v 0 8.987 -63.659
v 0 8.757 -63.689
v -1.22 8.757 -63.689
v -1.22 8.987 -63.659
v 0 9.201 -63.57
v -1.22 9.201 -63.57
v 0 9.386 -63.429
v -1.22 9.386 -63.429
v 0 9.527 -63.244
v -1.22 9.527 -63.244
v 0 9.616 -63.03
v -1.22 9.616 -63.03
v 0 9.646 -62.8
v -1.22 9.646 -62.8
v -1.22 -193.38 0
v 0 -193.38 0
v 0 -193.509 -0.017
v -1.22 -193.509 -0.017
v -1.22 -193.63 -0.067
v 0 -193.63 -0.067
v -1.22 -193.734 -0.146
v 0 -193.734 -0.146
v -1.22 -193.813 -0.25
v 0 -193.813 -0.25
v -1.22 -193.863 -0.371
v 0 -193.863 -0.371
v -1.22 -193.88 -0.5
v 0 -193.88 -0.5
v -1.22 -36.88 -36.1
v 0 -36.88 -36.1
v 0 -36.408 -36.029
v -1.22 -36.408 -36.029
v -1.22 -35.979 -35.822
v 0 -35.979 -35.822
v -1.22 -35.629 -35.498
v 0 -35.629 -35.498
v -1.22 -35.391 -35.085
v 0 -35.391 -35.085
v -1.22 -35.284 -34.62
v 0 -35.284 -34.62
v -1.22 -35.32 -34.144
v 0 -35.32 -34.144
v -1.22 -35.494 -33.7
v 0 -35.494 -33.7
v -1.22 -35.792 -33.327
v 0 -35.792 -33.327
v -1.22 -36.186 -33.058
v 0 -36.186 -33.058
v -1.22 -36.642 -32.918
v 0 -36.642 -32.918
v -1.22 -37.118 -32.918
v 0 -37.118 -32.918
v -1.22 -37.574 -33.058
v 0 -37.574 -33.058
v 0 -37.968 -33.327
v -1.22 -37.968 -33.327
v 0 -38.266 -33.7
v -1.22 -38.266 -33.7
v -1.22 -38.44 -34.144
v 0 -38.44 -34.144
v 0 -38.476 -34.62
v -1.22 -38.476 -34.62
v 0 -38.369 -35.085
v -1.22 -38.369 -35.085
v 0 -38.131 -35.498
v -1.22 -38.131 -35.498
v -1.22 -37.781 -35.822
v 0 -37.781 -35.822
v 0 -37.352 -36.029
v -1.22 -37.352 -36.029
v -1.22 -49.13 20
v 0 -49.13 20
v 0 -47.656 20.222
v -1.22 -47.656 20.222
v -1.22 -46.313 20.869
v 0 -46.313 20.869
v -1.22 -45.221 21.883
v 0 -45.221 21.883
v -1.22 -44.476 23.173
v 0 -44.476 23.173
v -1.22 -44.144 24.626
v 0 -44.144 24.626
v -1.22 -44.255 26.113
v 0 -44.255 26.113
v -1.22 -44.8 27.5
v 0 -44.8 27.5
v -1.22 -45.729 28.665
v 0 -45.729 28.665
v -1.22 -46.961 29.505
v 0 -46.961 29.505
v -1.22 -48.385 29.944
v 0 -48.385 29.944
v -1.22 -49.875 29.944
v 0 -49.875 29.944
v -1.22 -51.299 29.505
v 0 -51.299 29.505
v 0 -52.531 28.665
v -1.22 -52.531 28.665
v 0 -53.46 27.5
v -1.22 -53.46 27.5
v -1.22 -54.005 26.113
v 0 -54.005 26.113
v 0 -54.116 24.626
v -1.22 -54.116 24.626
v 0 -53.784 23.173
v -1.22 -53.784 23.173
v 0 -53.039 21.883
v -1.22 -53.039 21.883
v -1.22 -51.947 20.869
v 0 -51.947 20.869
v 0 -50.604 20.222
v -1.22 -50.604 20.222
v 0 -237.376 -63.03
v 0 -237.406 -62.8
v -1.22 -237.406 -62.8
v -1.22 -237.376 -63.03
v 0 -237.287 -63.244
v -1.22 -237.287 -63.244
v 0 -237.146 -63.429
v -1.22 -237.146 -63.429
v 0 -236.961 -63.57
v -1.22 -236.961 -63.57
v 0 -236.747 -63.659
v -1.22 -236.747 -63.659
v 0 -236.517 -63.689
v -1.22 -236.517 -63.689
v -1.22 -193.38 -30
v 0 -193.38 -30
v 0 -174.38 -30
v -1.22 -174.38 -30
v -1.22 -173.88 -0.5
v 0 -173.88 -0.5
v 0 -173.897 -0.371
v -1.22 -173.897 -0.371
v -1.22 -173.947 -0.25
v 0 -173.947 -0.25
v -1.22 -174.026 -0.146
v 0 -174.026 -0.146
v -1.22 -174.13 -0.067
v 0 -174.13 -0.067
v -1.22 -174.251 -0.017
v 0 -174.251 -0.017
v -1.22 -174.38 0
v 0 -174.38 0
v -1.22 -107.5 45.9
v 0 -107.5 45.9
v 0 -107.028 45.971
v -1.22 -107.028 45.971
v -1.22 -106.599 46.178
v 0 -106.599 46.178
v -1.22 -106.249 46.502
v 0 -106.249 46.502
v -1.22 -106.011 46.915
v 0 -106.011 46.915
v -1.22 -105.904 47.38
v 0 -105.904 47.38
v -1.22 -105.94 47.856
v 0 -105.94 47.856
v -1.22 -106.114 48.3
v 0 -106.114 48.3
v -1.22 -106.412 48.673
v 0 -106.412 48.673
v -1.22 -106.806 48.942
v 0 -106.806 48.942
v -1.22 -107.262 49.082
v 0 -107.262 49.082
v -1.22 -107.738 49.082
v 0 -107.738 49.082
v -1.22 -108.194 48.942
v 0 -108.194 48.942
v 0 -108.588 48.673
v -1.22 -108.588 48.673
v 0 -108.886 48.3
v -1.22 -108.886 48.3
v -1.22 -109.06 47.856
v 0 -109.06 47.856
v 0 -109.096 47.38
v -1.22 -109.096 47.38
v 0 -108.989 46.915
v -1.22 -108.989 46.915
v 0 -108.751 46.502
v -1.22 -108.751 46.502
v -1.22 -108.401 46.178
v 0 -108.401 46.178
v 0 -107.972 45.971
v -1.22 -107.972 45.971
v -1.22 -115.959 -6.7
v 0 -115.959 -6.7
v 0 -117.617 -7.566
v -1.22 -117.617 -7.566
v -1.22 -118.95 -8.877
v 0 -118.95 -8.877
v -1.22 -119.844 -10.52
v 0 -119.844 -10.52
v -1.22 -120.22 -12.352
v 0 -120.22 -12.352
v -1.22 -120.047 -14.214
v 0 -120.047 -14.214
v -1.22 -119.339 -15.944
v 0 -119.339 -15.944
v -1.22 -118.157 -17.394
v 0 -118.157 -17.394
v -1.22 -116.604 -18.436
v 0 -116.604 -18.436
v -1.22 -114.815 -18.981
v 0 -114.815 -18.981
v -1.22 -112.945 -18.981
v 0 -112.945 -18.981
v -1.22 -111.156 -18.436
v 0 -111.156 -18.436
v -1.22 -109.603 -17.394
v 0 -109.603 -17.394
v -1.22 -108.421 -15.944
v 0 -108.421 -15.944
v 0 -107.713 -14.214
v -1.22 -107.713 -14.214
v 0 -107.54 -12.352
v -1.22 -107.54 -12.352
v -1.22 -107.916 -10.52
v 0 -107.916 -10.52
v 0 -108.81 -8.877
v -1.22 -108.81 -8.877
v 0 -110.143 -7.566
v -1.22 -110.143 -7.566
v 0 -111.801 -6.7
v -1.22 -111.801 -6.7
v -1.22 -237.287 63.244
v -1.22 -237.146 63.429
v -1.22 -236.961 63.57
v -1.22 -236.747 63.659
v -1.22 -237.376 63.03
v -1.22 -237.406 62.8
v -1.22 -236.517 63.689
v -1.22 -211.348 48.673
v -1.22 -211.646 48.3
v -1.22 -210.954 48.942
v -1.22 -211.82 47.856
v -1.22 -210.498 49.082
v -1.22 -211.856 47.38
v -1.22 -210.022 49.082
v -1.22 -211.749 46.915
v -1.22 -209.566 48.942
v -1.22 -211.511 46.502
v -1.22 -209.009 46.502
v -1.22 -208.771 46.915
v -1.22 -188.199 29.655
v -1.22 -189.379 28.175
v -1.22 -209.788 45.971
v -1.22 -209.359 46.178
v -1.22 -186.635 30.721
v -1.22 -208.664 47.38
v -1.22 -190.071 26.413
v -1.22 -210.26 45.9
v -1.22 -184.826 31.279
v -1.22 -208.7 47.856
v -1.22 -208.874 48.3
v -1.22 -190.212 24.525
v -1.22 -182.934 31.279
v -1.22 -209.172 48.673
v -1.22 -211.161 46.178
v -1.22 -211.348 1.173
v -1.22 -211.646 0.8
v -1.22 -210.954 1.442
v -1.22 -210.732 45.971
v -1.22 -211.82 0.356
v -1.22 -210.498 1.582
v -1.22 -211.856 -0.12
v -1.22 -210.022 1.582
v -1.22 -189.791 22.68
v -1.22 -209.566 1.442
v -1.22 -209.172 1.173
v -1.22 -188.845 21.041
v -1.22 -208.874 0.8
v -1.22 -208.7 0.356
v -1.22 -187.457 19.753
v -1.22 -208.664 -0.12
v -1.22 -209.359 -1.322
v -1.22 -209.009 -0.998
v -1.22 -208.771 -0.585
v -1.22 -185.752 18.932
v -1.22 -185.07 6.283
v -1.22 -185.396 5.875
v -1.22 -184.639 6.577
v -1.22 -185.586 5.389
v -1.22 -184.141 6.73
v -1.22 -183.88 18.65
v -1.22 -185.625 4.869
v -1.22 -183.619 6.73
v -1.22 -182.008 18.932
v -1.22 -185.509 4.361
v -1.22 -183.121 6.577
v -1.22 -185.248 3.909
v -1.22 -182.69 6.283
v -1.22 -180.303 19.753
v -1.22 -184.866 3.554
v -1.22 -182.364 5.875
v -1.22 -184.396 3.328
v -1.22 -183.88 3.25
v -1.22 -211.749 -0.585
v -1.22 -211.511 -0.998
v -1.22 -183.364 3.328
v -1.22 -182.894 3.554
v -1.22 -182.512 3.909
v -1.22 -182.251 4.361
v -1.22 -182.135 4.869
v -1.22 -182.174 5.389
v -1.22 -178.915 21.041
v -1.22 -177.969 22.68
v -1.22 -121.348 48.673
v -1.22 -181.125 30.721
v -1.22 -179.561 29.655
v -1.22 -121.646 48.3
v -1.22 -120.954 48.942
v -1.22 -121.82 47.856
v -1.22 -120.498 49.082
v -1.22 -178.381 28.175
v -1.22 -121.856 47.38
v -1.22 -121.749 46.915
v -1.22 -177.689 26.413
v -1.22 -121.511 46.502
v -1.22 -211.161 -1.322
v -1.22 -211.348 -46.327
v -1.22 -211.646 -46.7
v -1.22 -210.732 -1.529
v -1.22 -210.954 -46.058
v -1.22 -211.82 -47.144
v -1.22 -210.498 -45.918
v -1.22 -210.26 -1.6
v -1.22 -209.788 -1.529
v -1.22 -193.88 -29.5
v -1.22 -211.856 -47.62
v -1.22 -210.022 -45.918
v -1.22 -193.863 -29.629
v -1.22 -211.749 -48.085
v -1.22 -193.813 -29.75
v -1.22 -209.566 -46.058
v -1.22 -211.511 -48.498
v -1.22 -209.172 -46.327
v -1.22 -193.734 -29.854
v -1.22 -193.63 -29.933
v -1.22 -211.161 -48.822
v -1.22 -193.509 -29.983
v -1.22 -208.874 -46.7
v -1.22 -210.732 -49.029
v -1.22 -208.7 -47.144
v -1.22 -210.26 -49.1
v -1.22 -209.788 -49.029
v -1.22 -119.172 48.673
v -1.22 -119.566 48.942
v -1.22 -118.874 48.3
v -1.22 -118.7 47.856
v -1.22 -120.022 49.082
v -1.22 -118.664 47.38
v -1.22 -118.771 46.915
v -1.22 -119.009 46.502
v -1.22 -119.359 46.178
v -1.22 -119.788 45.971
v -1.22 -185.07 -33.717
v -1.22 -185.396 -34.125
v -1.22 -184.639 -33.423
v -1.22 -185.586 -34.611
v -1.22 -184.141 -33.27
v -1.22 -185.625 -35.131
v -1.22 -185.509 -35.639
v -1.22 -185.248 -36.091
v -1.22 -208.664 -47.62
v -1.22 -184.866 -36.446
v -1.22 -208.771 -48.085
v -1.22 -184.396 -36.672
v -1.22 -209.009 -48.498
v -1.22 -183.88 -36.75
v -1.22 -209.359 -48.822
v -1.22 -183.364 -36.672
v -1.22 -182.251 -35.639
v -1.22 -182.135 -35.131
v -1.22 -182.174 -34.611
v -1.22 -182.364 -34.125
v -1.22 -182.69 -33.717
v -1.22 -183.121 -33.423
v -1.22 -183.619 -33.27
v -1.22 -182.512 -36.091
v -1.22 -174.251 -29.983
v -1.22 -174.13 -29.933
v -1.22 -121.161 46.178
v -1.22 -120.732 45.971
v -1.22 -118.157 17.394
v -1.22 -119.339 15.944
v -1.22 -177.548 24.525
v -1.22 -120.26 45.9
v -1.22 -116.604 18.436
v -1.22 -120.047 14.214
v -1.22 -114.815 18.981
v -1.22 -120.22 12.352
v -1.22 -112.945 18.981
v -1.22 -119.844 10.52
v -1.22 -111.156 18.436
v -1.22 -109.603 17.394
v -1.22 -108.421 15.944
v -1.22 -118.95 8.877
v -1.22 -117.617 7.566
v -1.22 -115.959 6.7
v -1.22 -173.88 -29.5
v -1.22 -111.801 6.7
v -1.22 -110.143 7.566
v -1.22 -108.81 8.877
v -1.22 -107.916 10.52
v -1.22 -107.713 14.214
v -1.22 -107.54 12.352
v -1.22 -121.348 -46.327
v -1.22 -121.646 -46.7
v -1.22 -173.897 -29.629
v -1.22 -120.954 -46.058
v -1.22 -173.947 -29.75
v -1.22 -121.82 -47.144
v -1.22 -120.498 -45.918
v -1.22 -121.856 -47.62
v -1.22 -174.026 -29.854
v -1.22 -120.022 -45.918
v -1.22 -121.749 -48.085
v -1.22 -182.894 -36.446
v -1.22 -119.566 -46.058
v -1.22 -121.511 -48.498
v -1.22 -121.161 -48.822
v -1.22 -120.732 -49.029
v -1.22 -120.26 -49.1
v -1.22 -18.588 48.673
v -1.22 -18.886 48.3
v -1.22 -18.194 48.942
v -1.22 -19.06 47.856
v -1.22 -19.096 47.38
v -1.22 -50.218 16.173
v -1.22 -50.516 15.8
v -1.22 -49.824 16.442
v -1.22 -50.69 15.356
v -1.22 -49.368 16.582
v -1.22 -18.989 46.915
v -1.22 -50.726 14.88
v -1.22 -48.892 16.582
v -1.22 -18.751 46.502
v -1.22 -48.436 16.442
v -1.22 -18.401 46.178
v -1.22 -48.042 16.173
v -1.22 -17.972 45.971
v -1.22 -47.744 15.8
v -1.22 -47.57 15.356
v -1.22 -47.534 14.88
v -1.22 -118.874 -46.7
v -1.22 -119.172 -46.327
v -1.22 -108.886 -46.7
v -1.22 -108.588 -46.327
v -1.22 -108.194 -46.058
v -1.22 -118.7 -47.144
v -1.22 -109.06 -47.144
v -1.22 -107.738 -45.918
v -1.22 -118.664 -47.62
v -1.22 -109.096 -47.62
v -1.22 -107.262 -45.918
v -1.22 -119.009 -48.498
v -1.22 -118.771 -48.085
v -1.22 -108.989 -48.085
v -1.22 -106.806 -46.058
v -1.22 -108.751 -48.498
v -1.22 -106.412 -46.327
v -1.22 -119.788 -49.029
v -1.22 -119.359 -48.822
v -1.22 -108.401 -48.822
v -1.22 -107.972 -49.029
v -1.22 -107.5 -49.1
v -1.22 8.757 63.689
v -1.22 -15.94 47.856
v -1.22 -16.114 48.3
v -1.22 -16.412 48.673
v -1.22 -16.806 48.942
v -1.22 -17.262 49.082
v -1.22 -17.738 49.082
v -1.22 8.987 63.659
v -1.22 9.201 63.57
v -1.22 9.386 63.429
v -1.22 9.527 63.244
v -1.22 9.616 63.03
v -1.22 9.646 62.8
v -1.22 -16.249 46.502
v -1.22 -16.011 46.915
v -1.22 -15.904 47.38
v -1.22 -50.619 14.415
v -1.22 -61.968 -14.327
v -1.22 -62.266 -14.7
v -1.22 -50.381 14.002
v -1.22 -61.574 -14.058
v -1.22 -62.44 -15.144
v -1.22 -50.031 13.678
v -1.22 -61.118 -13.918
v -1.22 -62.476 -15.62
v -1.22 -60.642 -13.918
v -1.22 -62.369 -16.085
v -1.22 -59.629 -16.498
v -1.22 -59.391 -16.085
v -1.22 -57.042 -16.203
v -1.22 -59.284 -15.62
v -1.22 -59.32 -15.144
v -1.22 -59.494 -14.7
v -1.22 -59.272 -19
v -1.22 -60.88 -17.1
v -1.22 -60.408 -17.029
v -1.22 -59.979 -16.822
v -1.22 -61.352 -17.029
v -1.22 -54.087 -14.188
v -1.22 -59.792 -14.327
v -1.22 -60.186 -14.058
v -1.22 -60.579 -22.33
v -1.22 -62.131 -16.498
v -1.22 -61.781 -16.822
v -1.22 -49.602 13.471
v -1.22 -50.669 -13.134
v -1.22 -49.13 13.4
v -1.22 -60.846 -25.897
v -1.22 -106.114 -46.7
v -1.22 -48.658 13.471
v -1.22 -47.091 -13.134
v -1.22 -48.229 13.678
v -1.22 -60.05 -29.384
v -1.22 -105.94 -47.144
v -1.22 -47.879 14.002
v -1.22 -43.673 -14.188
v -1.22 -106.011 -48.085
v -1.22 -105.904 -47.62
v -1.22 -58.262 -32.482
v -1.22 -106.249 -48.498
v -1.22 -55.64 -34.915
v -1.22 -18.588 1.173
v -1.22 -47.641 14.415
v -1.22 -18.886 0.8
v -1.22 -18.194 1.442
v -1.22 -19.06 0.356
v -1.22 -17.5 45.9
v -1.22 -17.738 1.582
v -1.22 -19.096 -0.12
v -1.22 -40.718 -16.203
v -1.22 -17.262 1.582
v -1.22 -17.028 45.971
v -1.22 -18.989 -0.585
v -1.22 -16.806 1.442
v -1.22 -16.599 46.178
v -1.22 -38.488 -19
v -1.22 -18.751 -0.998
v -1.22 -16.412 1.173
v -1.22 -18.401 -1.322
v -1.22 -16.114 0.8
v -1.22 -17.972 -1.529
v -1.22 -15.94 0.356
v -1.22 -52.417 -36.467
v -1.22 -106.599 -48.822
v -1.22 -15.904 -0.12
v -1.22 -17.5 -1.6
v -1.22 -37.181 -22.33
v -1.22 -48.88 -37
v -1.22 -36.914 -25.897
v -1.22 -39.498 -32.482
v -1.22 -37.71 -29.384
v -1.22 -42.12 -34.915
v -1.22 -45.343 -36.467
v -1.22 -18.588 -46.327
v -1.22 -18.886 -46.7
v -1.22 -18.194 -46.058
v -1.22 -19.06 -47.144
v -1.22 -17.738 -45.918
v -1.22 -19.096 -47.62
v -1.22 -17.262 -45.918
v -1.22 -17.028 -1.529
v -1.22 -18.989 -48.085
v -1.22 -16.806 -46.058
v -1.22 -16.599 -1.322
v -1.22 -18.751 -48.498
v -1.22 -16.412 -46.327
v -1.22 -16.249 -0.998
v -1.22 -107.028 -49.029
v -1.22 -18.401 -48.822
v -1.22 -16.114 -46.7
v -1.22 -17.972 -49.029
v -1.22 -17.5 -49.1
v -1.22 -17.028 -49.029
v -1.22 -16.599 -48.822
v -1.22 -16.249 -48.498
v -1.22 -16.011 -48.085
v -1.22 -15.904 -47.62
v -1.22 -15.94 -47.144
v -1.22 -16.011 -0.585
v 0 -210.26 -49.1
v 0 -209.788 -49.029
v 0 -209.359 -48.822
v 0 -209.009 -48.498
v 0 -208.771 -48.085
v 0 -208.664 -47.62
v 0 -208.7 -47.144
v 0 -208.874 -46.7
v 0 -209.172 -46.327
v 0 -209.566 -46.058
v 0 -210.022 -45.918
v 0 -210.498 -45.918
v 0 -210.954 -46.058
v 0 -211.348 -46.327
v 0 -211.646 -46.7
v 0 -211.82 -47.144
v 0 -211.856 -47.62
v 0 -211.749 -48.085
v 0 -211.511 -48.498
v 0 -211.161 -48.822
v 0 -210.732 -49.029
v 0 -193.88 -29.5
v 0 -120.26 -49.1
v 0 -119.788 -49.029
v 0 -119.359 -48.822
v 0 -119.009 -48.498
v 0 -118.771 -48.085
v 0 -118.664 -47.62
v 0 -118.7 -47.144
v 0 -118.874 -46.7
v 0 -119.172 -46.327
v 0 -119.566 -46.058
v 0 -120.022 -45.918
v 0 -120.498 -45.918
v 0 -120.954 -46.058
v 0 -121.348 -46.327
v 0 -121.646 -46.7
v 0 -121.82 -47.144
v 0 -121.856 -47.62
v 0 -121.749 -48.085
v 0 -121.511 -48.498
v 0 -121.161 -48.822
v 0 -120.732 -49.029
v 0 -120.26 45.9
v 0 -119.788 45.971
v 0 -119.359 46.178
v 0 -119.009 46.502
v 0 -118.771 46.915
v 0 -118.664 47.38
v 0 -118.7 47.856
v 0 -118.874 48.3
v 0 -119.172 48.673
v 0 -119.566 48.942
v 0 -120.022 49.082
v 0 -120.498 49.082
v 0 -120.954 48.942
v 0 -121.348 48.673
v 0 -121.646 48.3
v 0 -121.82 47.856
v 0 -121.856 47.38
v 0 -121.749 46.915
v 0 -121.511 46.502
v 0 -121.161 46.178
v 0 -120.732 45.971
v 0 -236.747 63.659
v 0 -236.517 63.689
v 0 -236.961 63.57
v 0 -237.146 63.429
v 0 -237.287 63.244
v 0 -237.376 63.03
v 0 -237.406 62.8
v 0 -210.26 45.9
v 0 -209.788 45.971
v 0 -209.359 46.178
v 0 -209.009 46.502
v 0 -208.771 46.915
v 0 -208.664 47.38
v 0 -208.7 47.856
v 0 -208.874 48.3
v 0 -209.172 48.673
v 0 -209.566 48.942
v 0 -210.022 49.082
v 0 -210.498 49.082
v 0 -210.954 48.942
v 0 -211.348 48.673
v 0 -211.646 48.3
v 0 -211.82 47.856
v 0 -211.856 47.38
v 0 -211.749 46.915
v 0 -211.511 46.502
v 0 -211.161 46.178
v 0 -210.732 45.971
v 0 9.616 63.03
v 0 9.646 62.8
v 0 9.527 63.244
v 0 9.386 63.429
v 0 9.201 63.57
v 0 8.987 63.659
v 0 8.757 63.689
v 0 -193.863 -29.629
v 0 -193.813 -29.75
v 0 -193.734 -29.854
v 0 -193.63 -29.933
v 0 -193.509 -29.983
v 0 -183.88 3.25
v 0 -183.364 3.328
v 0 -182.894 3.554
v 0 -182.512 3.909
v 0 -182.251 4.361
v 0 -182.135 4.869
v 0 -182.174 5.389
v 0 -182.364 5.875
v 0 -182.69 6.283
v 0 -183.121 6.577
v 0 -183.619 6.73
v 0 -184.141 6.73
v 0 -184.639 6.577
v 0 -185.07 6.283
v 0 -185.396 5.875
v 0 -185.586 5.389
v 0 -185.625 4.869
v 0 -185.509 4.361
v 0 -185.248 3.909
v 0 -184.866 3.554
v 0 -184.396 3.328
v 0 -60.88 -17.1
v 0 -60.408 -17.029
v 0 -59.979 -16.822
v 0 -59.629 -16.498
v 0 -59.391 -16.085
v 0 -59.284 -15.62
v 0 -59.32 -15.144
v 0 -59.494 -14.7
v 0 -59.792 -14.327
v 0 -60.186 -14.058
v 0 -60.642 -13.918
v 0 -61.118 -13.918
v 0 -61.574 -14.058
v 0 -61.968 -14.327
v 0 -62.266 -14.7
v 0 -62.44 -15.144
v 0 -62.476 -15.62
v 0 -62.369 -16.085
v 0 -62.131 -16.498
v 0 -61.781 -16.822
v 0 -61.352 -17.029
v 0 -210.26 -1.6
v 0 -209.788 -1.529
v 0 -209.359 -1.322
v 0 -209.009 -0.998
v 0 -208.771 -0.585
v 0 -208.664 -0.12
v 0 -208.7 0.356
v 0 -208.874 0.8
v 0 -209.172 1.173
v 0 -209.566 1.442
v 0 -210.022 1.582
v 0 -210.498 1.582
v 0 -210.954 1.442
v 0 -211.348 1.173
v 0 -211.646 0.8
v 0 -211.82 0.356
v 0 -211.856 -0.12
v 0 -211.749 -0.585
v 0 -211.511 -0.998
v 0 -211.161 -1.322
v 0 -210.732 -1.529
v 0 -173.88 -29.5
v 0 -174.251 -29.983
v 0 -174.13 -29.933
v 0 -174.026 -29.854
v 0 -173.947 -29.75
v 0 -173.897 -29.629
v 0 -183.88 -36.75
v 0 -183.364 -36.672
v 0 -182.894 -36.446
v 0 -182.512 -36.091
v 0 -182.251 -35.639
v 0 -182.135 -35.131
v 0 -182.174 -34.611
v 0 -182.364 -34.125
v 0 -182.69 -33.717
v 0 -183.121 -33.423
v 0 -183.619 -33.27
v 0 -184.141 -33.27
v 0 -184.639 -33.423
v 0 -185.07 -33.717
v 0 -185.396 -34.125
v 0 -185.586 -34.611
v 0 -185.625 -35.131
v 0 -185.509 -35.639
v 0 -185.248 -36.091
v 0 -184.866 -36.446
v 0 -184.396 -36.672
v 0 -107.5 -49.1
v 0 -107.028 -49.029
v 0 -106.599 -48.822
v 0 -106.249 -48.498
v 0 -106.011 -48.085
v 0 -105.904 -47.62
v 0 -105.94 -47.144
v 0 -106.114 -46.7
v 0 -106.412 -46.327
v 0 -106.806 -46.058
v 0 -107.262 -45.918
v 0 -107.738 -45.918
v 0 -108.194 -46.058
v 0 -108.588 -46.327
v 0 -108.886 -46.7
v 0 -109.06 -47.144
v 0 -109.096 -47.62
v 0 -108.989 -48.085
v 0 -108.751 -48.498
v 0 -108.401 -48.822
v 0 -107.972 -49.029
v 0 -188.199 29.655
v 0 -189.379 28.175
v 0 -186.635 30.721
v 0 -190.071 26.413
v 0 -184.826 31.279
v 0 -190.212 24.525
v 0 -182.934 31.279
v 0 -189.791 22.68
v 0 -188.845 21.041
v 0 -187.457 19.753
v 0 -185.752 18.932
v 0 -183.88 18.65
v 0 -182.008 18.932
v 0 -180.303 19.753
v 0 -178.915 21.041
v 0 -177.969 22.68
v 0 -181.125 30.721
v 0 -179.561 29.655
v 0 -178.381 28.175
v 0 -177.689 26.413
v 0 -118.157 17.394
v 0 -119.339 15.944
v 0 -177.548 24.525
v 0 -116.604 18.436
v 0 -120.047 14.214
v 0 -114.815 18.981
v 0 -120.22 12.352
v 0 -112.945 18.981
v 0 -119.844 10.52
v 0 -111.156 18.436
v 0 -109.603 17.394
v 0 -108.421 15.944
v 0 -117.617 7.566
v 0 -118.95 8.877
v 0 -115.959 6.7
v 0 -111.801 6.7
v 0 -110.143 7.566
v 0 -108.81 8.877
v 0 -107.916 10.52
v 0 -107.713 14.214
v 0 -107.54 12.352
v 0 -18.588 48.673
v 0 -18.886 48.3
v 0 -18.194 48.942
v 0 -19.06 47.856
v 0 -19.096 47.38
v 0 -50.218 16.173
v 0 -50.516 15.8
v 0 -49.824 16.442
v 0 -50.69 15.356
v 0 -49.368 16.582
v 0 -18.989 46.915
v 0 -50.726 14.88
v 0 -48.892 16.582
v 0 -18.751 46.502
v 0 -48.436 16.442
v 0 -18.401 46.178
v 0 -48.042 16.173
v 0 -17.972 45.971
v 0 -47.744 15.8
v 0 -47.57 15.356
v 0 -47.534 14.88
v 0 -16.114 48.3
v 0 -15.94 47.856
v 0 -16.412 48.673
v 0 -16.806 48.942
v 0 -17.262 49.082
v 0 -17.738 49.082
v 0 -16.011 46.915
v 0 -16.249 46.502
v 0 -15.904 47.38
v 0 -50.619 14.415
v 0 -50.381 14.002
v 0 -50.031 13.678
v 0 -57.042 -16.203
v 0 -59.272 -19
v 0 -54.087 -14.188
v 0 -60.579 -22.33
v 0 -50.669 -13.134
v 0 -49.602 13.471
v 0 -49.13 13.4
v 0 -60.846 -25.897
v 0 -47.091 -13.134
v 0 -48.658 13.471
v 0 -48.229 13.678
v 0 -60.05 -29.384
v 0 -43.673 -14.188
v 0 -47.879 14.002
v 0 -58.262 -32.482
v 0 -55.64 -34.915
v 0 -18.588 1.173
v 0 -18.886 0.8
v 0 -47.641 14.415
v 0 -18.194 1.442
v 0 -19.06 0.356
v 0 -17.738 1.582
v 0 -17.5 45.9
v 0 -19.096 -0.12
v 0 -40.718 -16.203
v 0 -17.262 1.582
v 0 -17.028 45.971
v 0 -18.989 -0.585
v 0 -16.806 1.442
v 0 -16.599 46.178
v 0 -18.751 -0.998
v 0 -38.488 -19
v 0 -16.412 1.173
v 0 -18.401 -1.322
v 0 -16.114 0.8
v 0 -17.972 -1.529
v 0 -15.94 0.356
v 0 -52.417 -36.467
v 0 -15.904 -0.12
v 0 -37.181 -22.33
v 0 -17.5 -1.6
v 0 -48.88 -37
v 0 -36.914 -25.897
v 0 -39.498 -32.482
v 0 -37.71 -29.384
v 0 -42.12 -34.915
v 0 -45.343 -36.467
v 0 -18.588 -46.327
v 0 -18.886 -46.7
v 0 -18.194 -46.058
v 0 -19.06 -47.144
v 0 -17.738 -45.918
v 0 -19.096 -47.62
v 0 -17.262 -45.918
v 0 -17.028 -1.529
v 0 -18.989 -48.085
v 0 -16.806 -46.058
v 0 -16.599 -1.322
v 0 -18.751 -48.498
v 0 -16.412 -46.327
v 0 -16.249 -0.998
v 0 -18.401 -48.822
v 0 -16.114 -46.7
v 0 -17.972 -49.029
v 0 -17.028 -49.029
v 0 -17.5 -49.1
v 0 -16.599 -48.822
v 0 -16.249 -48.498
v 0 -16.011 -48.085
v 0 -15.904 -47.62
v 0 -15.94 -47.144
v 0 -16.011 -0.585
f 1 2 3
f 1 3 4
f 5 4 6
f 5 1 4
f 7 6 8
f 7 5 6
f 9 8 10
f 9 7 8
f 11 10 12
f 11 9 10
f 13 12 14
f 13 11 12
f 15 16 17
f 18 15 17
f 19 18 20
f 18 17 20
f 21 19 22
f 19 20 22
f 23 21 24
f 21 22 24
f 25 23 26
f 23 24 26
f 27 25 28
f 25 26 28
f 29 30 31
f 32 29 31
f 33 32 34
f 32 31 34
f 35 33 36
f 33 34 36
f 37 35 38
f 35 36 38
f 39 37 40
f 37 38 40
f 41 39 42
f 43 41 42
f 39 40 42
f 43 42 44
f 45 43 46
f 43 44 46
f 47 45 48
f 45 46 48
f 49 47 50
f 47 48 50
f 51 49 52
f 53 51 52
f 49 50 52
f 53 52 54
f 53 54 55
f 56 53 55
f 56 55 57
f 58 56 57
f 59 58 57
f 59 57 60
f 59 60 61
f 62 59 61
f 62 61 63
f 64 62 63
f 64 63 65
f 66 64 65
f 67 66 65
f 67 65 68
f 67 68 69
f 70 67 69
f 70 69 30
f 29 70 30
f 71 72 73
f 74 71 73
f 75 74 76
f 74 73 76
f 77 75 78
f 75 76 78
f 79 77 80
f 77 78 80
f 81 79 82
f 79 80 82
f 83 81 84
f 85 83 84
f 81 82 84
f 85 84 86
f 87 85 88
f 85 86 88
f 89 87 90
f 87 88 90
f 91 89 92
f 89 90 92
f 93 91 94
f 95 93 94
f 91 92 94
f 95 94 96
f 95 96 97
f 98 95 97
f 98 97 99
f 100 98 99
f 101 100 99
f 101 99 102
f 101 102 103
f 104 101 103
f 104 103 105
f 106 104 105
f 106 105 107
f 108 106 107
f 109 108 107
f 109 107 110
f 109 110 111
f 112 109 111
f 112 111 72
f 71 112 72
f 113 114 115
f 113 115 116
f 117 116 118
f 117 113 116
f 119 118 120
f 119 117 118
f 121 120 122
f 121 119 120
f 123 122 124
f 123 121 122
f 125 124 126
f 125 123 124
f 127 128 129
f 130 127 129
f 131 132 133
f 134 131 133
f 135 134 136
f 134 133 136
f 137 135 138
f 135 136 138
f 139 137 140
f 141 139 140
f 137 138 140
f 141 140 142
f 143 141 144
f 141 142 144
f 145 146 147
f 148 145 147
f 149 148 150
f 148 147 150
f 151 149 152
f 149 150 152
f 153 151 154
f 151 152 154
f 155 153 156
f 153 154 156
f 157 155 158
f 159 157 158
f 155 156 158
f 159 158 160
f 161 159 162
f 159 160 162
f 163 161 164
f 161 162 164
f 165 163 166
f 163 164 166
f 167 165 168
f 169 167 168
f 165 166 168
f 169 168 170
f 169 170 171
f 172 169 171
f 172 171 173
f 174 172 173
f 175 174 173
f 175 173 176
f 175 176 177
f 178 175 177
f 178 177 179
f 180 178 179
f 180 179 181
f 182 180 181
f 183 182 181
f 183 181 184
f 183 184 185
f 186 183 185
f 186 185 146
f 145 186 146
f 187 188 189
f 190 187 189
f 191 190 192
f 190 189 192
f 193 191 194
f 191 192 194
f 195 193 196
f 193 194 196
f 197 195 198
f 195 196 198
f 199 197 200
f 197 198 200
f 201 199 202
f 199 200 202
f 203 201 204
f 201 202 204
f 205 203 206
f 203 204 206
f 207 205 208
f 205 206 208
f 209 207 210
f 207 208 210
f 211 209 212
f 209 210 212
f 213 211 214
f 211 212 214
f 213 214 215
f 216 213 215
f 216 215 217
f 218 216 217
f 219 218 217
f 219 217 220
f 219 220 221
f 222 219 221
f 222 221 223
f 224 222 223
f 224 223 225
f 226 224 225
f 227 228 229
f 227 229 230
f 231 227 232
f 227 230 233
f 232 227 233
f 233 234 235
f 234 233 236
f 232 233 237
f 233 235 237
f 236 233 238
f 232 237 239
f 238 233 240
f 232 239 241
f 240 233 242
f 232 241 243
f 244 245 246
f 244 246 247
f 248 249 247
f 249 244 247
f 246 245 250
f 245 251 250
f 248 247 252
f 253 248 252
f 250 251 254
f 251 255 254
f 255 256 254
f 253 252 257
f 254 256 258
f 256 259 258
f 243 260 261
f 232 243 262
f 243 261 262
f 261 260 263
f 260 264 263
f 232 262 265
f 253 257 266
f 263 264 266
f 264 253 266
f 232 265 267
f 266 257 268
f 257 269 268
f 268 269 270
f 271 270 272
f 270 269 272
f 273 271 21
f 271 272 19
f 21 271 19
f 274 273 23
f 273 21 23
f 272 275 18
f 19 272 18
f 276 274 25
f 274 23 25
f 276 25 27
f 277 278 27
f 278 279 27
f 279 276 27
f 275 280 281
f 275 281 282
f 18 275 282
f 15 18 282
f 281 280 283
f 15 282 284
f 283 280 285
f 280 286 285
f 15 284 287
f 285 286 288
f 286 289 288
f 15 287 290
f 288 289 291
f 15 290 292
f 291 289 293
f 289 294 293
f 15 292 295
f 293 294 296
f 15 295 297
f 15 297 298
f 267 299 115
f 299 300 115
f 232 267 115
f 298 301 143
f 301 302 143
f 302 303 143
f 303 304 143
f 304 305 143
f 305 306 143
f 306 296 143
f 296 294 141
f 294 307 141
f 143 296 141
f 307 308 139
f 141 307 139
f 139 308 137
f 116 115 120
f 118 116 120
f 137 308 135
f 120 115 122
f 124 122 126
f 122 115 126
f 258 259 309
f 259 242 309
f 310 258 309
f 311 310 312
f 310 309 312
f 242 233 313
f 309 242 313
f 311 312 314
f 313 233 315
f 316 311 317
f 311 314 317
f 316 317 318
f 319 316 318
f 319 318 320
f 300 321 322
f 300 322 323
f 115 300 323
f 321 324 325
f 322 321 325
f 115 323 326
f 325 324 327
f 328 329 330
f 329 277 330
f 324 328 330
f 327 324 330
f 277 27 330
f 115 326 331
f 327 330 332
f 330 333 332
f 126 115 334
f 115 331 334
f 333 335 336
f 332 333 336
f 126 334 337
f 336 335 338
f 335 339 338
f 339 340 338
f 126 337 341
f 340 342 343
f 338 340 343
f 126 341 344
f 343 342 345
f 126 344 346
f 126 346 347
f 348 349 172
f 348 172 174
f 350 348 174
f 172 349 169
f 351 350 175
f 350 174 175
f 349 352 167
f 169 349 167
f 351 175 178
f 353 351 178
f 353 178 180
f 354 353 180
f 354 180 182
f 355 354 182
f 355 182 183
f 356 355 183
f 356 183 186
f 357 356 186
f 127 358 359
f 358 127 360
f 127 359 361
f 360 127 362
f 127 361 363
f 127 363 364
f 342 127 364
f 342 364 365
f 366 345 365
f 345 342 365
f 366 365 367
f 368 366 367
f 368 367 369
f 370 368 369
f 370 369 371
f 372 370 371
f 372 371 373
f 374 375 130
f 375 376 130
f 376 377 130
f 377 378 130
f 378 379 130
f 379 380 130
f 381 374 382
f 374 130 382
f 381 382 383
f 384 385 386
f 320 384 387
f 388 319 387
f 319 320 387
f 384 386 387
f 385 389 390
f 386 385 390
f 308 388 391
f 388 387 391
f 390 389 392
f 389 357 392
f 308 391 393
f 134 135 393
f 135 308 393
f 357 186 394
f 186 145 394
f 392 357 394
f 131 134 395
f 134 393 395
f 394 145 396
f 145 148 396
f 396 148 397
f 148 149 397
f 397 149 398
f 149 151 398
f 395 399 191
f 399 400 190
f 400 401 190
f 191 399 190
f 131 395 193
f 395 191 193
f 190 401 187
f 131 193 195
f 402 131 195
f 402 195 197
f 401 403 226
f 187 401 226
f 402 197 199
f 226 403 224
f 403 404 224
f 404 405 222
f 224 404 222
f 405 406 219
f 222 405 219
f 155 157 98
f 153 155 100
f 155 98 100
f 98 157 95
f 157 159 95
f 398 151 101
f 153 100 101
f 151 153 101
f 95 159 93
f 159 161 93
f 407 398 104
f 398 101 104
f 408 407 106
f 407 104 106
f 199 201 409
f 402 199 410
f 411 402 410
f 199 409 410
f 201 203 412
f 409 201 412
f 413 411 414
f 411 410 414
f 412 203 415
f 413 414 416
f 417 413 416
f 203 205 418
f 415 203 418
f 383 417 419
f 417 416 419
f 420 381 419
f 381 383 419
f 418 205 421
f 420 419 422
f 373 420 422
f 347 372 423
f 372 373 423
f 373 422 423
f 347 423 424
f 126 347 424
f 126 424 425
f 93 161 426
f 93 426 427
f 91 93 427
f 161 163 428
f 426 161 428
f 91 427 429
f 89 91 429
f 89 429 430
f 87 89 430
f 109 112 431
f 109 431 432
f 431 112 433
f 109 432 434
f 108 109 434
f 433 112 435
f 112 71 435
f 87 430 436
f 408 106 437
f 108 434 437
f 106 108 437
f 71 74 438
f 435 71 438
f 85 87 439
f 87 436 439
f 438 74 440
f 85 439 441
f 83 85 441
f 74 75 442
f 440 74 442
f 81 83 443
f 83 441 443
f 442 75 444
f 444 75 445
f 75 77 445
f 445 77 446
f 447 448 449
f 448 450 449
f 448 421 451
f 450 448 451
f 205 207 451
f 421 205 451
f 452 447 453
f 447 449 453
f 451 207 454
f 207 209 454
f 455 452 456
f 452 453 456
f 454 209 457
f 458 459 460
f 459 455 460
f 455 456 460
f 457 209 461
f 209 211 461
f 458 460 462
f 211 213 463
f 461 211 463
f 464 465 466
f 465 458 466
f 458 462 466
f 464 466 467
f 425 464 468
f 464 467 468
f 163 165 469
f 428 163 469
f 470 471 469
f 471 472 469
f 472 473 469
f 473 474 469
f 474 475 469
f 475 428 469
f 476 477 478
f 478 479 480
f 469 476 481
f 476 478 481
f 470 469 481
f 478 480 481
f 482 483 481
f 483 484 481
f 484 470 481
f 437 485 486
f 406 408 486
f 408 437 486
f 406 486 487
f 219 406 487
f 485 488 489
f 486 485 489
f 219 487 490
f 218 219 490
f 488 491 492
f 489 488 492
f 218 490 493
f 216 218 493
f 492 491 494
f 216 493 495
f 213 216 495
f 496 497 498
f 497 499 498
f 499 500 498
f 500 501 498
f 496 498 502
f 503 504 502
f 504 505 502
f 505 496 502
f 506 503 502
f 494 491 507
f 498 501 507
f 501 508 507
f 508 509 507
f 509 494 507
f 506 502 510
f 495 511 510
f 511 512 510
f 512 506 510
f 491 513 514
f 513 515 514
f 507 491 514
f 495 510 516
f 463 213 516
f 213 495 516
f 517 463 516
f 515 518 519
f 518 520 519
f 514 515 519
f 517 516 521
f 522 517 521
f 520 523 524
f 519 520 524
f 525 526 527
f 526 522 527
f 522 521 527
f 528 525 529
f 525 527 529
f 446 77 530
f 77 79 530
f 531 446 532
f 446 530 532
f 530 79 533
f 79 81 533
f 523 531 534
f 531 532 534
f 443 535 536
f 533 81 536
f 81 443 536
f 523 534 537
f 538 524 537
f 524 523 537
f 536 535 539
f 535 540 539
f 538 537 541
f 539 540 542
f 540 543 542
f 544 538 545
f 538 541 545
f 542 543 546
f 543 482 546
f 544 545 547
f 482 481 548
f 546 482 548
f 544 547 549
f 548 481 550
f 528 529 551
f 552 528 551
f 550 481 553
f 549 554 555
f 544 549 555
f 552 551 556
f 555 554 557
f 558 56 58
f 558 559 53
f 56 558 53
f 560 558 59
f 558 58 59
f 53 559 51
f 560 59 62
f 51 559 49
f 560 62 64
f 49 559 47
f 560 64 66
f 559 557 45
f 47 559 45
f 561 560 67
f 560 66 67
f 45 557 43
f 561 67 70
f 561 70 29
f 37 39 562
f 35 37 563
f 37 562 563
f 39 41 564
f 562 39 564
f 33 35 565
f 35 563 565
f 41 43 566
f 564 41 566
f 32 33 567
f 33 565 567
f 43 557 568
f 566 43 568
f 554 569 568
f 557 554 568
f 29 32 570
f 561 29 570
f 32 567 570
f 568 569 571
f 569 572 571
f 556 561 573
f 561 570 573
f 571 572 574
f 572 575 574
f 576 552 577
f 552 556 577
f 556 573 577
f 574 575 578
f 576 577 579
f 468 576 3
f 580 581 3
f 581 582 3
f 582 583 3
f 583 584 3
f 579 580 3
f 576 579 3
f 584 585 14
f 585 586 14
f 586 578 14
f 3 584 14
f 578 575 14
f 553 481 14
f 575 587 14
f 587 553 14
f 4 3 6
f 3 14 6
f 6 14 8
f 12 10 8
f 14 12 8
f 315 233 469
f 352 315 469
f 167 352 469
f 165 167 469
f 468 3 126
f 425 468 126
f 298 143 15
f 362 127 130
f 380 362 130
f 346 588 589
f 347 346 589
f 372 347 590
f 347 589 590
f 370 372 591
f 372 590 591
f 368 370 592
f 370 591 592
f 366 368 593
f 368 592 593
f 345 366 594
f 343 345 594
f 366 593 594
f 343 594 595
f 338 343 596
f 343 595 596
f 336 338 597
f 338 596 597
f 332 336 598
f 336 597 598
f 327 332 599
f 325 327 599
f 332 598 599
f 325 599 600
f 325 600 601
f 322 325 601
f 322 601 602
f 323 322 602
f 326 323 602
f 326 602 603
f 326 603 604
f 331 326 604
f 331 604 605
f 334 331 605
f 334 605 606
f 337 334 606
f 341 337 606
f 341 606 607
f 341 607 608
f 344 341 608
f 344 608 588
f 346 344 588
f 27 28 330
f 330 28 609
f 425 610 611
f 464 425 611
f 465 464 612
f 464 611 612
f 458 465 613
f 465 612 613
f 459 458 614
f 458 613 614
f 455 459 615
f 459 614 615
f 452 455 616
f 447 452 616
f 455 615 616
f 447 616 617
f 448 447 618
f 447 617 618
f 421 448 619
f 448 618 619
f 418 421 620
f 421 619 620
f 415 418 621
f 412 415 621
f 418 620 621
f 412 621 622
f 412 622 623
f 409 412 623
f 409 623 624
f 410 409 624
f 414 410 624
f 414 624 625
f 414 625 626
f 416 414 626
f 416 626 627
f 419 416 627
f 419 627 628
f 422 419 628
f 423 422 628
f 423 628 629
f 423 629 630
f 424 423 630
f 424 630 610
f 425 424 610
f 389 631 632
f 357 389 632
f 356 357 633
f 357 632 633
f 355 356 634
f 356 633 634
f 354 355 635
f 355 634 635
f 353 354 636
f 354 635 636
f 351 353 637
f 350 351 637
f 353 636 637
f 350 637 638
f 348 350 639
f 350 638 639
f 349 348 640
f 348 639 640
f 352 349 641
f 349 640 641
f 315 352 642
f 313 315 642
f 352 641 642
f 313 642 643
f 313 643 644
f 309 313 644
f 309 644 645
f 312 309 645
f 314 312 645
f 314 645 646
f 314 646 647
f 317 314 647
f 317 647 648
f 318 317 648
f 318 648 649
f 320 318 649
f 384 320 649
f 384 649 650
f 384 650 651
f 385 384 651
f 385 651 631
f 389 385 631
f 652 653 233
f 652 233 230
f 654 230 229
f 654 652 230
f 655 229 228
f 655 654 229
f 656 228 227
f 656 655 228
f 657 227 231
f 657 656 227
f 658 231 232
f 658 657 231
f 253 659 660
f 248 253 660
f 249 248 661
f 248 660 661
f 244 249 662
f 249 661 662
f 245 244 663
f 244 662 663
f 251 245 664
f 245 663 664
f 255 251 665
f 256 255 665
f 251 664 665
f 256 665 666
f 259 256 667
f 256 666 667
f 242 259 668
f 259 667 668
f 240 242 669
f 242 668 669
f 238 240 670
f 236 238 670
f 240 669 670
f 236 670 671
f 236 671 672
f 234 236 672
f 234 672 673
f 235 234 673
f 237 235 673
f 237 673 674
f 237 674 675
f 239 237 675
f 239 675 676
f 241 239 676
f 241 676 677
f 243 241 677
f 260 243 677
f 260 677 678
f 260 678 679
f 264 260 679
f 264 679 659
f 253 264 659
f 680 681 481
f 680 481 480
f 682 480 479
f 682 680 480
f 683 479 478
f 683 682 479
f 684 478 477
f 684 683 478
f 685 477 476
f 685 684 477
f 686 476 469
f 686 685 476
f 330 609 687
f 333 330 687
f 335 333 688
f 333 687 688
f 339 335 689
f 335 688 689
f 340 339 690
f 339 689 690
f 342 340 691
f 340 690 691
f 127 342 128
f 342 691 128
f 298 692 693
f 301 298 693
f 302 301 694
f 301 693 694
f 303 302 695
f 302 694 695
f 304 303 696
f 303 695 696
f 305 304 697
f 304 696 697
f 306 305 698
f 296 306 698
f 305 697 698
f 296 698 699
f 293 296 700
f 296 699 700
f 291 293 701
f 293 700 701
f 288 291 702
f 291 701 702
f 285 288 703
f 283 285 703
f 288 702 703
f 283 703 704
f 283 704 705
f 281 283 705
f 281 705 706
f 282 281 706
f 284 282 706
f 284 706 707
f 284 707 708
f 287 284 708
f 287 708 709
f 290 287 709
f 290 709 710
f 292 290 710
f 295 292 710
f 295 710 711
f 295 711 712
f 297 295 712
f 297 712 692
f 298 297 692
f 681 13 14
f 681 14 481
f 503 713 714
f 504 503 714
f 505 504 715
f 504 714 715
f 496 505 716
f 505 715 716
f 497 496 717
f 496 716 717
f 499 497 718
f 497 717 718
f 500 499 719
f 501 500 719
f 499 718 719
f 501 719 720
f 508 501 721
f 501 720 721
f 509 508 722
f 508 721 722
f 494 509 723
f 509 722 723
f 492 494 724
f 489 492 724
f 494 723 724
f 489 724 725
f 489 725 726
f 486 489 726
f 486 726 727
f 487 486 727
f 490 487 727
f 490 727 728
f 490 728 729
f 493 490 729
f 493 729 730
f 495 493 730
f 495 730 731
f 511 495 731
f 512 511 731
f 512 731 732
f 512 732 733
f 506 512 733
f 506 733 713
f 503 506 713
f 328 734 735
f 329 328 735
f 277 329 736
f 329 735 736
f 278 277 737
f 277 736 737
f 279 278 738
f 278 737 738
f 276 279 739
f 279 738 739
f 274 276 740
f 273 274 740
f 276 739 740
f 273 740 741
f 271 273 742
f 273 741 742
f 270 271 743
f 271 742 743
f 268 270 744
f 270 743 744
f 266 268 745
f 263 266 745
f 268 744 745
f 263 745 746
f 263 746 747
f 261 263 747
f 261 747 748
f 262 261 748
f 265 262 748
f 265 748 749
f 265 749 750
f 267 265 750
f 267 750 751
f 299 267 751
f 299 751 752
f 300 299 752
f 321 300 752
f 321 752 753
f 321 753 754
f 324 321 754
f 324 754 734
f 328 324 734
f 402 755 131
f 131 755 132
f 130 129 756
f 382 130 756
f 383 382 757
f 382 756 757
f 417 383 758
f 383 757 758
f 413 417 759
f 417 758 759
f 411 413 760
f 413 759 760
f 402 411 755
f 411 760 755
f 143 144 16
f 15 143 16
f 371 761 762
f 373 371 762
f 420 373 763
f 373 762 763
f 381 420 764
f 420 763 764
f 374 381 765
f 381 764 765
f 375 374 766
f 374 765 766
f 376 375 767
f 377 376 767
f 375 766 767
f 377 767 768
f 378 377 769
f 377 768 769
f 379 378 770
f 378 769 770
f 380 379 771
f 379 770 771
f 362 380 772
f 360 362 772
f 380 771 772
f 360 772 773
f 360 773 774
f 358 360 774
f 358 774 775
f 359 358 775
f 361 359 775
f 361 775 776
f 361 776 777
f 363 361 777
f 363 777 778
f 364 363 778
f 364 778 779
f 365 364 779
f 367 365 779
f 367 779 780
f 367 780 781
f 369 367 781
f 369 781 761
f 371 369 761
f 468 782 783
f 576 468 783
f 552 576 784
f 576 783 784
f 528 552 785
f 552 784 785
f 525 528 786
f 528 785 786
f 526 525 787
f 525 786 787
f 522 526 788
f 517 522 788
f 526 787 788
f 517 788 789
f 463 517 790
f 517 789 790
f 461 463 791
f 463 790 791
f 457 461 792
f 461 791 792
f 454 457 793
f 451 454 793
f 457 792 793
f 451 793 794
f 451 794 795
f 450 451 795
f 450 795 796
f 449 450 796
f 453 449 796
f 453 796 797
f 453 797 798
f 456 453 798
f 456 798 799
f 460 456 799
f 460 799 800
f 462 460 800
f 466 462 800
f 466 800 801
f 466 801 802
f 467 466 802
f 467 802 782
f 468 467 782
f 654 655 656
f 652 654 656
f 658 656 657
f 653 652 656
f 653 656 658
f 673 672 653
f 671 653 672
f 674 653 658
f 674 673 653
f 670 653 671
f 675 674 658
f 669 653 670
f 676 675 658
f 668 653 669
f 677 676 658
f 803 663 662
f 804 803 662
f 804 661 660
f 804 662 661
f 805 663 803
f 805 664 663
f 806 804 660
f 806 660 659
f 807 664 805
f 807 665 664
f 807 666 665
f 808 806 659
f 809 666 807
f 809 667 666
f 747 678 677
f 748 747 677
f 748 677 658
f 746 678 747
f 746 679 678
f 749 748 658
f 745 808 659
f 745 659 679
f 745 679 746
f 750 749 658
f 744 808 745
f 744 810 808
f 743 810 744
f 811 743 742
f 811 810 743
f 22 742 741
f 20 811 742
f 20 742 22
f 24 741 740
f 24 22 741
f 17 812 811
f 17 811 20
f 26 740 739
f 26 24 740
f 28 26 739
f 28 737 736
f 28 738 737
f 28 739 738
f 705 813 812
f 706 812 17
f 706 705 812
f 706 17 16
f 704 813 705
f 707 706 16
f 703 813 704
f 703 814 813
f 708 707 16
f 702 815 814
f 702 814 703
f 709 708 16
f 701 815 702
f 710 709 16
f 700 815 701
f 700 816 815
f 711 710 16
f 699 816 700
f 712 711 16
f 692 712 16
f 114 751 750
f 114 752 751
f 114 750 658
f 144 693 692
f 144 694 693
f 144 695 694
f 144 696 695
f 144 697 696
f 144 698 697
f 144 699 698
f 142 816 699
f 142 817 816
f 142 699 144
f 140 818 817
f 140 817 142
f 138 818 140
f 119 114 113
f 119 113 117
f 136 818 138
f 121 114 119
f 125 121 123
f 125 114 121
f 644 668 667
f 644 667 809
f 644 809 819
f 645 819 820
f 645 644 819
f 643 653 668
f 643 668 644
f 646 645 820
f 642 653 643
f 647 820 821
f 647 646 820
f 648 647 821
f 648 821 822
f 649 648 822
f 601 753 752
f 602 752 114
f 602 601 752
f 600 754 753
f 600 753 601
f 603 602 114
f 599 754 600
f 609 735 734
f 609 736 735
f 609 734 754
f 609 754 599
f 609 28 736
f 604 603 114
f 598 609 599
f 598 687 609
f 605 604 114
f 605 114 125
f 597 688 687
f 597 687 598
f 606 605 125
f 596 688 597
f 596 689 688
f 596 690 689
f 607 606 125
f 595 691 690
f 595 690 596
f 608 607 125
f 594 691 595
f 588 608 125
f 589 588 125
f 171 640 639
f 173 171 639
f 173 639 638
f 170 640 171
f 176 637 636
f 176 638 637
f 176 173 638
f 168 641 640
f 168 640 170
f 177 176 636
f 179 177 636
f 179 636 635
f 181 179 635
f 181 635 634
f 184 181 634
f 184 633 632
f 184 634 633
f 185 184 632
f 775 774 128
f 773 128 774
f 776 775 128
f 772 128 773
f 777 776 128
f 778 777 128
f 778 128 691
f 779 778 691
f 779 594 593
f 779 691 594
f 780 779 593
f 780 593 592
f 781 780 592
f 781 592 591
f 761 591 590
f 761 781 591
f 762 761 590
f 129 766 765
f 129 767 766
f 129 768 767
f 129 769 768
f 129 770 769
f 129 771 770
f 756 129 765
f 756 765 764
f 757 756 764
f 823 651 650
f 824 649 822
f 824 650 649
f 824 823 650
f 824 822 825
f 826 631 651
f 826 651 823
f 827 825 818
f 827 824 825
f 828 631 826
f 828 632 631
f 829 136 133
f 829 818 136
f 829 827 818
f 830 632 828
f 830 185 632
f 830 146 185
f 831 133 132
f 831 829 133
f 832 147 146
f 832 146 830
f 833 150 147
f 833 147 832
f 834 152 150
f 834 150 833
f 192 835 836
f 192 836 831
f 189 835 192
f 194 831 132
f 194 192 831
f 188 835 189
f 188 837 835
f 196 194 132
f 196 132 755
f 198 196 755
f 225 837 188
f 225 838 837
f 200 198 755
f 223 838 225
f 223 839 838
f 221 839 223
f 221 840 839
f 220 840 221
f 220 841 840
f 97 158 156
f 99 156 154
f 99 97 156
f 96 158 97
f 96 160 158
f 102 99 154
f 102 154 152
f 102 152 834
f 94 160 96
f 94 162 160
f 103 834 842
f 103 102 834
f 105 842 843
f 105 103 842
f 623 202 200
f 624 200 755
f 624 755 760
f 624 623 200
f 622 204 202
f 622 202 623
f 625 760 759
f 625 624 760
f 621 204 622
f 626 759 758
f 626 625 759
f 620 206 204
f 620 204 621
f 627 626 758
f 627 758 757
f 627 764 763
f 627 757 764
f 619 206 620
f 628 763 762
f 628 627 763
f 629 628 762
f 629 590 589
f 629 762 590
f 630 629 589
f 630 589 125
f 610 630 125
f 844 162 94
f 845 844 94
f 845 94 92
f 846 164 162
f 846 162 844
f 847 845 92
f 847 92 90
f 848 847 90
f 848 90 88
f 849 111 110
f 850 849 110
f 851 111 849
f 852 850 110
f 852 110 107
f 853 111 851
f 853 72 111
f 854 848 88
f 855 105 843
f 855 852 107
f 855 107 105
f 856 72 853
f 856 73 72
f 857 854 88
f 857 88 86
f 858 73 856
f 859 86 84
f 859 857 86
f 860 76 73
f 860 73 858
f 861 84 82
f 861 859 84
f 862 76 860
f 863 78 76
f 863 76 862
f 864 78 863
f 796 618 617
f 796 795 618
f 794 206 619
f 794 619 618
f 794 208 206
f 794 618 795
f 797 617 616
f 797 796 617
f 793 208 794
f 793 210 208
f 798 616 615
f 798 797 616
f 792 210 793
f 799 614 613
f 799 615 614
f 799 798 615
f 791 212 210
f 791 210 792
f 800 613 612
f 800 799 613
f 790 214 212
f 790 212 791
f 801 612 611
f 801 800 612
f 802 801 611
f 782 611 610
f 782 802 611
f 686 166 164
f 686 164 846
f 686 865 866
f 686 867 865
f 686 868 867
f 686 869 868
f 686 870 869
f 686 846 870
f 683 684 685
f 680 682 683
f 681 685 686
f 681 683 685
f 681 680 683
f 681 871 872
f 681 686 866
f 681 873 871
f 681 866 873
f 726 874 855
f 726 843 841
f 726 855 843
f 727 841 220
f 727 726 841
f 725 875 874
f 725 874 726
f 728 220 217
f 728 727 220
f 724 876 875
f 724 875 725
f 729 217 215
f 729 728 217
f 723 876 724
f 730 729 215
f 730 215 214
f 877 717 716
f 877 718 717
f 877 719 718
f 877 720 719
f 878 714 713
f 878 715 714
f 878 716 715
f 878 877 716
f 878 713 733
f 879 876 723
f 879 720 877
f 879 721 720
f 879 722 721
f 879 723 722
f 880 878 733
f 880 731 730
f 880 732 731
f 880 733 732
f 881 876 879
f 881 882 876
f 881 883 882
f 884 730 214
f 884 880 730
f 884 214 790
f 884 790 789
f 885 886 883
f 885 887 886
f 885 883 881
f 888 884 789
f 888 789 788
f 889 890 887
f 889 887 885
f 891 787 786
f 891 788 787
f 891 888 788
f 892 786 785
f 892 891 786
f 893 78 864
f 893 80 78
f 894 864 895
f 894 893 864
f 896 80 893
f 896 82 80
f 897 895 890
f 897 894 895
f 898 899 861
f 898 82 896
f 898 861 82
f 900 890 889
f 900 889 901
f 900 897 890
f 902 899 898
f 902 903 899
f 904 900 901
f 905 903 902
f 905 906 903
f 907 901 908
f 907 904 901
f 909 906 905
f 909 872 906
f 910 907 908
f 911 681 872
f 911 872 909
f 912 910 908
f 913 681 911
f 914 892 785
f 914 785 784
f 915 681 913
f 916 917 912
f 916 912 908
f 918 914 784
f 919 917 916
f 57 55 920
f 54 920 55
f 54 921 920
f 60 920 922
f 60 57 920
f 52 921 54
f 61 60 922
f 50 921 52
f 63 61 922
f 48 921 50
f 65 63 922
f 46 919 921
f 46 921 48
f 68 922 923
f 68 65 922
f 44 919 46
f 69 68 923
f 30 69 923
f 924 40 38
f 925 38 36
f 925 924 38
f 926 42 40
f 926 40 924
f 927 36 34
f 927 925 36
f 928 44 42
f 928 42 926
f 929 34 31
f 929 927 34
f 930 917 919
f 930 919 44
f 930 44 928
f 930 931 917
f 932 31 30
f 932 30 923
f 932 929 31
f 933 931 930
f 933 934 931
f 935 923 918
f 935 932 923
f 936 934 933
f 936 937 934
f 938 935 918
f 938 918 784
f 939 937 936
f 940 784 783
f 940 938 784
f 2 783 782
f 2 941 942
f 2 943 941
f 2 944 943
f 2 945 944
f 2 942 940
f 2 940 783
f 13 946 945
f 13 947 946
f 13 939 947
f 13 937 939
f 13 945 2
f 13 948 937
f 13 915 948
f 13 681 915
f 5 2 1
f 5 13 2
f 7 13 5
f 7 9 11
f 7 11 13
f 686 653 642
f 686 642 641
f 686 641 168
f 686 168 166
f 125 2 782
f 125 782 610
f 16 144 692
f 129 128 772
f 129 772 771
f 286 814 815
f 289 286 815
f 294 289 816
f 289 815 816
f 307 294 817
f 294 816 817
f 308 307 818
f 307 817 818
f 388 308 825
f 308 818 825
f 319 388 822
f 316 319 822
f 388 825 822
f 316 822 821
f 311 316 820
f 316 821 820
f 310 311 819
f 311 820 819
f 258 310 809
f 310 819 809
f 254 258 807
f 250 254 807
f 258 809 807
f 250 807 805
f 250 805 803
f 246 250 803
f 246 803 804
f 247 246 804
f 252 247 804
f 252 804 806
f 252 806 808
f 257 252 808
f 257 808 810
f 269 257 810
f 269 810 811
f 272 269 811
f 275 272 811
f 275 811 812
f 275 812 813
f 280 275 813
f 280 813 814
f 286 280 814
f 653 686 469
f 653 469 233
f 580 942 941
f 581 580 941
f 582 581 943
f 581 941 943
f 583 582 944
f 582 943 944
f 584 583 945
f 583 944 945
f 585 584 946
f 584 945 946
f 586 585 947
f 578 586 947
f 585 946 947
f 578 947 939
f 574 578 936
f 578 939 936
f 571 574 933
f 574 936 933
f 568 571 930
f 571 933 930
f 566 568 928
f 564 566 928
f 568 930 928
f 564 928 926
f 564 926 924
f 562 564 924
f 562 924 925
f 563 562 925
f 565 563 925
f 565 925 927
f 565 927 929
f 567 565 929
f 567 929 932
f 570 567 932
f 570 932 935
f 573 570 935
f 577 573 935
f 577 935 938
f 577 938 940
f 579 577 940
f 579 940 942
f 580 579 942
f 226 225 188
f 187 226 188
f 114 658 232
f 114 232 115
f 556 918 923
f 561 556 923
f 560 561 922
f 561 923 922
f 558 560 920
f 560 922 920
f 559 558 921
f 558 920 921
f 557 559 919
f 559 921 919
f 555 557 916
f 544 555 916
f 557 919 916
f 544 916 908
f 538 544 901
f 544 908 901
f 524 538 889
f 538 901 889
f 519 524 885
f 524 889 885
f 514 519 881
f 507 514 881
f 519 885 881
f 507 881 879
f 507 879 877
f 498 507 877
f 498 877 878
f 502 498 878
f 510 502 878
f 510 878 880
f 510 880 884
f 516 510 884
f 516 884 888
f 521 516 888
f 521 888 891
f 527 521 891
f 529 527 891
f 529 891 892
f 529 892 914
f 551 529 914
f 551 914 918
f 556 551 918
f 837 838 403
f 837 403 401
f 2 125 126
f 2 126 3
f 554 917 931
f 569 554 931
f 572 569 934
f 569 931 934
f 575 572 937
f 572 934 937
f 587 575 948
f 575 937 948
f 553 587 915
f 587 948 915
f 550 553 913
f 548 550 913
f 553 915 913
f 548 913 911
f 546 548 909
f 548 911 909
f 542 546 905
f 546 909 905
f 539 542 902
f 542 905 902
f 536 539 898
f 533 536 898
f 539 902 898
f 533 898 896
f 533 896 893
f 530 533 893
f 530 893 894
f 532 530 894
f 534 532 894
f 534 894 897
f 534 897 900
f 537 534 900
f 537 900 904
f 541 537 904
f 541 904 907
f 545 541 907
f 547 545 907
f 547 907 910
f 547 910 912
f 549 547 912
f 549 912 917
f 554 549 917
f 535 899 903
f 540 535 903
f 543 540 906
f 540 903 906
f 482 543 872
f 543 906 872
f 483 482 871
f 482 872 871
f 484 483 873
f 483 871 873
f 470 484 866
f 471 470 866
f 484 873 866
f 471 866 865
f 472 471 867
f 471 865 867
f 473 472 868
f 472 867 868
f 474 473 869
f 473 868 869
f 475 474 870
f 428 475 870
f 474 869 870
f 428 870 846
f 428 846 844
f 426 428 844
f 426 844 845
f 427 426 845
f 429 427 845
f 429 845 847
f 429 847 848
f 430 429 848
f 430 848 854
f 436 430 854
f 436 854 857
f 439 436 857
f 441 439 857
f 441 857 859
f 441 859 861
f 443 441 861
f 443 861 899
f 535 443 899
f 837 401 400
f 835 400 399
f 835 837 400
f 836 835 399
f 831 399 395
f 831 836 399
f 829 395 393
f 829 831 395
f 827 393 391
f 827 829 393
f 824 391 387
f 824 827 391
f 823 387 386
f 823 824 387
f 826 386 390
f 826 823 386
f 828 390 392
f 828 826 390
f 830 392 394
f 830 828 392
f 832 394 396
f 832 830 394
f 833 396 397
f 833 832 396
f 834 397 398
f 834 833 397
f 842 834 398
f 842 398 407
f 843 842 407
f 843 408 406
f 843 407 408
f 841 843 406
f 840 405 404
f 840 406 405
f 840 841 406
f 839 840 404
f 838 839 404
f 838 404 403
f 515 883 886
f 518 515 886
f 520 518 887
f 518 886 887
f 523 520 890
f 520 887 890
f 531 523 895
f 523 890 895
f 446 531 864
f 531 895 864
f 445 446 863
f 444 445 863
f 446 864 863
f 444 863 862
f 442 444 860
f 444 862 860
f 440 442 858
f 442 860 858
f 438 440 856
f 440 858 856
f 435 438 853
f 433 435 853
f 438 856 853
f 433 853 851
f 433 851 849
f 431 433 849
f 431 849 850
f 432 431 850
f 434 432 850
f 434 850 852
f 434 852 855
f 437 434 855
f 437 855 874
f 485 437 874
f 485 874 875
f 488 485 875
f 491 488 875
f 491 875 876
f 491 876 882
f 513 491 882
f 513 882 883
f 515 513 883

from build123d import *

# Parameters (mm, degrees)
BOSS_EXTRUDE1_DEPTH = 1.22
SKETCH3_R           = 1.6
CUT_EXTRUDE1_DEPTH  = 246.803551555
SKETCH4_R           = 12
SKETCH4_R_2         = 5
SKETCH4_R_3         = 1.75
SKETCH4_R_4         = 1.6
SKETCH4_R_5         = 6.35
CUT_EXTRUDE2_DEPTH  = 246.803551555


with BuildPart() as part:
    # Sketch1 → Boss-Extrude1 (new body)
    with BuildSketch(Plane(origin=(0, 0, 0), x_dir=(0, 0, -1), z_dir=(1, 0, 0))):
        with BuildLine():
            Line((62.8, 9.646), (-62.8, 9.646))
            ThreePointArc((-62.8, 9.646), (-63.428617928, 9.385617928), (-63.689, 8.757))
            Line((-63.689, 8.757), (-63.689, -236.517))
            ThreePointArc((-63.689, -236.517), (-63.428617928, -237.145617928), (-62.8, -237.406))
            Line((-62.8, -237.406), (62.8, -237.406))
            ThreePointArc((62.8, -237.406), (63.428617928, -237.145617928), (63.689, -236.517))
            Line((63.689, -236.517), (63.689, 8.757))
            ThreePointArc((63.689, 8.757), (63.428617928, 9.385617928), (62.8, 9.646))
        make_face()
    extrude(amount=-BOSS_EXTRUDE1_DEPTH)

    # Sketch3 → Cut-Extrude1 (cut, through all)
    with BuildSketch(Plane(origin=(0, 0, 0), x_dir=(0, 0, -1), z_dir=(1, 0, 0))):
        with Locations((47.5, -107.5)):
            Circle(SKETCH3_R)
        with Locations((-47.5, -107.5)):
            Circle(SKETCH3_R)
        with Locations((47.5, -17.5)):
            Circle(SKETCH3_R)
        with Locations((0, -17.5)):
            Circle(SKETCH3_R)
        with Locations((-47.5, -17.5)):
            Circle(SKETCH3_R)
        with Locations((-47.5, -210.26)):
            Circle(SKETCH3_R)
        with Locations((0, -210.26)):
            Circle(SKETCH3_R)
        with Locations((47.5, -210.26)):
            Circle(SKETCH3_R)
        with Locations((-47.5, -120.26)):
            Circle(SKETCH3_R)
        with Locations((47.5, -120.26)):
            Circle(SKETCH3_R)
    extrude(amount=-CUT_EXTRUDE1_DEPTH, mode=Mode.SUBTRACT)

    # Sketch4 → Cut-Extrude2 (cut, through all)
    with BuildSketch(Plane(origin=(0, 0, 0), x_dir=(0, 0, -1), z_dir=(1, 0, 0))):
        with Locations((25, -48.88)):
            Circle(SKETCH4_R)
        with Locations((-25, -49.13)):
            Circle(SKETCH4_R_2)
        with Locations((35, -183.88)):
            Circle(SKETCH4_R_3)
        with Locations((-5, -183.88)):
            Circle(SKETCH4_R_3)
        with Locations((34.5, -36.88)):
            Circle(SKETCH4_R_4)
        with Locations((15.5, -60.88)):
            Circle(SKETCH4_R_4)
        with Locations((-15, -49.13)):
            Circle(SKETCH4_R_4)
        with Locations((-25, -183.88)):
            Circle(SKETCH4_R_5)
        with BuildLine():
            Line((0.5, -193.88), (29.5, -193.88))
            ThreePointArc((29.5, -193.88), (29.853553391, -193.733553391), (30, -193.38))
            Line((30, -193.38), (30, -174.38))
            ThreePointArc((30, -174.38), (29.853553391, -174.026446609), (29.5, -173.88))
            Line((29.5, -173.88), (0.5, -173.88))
            ThreePointArc((0.5, -173.88), (0.146446609, -174.026446609), (0, -174.38))
            Line((0, -174.38), (0, -193.38))
            ThreePointArc((0, -193.38), (0.146446609, -193.733553391), (0.5, -193.88))
        make_face()
        with BuildLine():
            Line((6.7, -111.800937711), (6.7, -115.959062289))
            ThreePointArc((6.7, -115.959062289), (19.05, -113.88), (6.7, -111.800937711))
        make_face()
        with BuildLine():
            Line((-6.7, -111.800937711), (-6.7, -115.959062289))
            ThreePointArc((-6.7, -115.959062289), (-19.05, -113.88), (-6.7, -111.800937711))
        make_face()
    extrude(amount=-CUT_EXTRUDE2_DEPTH, mode=Mode.SUBTRACT)


solid = part.part
